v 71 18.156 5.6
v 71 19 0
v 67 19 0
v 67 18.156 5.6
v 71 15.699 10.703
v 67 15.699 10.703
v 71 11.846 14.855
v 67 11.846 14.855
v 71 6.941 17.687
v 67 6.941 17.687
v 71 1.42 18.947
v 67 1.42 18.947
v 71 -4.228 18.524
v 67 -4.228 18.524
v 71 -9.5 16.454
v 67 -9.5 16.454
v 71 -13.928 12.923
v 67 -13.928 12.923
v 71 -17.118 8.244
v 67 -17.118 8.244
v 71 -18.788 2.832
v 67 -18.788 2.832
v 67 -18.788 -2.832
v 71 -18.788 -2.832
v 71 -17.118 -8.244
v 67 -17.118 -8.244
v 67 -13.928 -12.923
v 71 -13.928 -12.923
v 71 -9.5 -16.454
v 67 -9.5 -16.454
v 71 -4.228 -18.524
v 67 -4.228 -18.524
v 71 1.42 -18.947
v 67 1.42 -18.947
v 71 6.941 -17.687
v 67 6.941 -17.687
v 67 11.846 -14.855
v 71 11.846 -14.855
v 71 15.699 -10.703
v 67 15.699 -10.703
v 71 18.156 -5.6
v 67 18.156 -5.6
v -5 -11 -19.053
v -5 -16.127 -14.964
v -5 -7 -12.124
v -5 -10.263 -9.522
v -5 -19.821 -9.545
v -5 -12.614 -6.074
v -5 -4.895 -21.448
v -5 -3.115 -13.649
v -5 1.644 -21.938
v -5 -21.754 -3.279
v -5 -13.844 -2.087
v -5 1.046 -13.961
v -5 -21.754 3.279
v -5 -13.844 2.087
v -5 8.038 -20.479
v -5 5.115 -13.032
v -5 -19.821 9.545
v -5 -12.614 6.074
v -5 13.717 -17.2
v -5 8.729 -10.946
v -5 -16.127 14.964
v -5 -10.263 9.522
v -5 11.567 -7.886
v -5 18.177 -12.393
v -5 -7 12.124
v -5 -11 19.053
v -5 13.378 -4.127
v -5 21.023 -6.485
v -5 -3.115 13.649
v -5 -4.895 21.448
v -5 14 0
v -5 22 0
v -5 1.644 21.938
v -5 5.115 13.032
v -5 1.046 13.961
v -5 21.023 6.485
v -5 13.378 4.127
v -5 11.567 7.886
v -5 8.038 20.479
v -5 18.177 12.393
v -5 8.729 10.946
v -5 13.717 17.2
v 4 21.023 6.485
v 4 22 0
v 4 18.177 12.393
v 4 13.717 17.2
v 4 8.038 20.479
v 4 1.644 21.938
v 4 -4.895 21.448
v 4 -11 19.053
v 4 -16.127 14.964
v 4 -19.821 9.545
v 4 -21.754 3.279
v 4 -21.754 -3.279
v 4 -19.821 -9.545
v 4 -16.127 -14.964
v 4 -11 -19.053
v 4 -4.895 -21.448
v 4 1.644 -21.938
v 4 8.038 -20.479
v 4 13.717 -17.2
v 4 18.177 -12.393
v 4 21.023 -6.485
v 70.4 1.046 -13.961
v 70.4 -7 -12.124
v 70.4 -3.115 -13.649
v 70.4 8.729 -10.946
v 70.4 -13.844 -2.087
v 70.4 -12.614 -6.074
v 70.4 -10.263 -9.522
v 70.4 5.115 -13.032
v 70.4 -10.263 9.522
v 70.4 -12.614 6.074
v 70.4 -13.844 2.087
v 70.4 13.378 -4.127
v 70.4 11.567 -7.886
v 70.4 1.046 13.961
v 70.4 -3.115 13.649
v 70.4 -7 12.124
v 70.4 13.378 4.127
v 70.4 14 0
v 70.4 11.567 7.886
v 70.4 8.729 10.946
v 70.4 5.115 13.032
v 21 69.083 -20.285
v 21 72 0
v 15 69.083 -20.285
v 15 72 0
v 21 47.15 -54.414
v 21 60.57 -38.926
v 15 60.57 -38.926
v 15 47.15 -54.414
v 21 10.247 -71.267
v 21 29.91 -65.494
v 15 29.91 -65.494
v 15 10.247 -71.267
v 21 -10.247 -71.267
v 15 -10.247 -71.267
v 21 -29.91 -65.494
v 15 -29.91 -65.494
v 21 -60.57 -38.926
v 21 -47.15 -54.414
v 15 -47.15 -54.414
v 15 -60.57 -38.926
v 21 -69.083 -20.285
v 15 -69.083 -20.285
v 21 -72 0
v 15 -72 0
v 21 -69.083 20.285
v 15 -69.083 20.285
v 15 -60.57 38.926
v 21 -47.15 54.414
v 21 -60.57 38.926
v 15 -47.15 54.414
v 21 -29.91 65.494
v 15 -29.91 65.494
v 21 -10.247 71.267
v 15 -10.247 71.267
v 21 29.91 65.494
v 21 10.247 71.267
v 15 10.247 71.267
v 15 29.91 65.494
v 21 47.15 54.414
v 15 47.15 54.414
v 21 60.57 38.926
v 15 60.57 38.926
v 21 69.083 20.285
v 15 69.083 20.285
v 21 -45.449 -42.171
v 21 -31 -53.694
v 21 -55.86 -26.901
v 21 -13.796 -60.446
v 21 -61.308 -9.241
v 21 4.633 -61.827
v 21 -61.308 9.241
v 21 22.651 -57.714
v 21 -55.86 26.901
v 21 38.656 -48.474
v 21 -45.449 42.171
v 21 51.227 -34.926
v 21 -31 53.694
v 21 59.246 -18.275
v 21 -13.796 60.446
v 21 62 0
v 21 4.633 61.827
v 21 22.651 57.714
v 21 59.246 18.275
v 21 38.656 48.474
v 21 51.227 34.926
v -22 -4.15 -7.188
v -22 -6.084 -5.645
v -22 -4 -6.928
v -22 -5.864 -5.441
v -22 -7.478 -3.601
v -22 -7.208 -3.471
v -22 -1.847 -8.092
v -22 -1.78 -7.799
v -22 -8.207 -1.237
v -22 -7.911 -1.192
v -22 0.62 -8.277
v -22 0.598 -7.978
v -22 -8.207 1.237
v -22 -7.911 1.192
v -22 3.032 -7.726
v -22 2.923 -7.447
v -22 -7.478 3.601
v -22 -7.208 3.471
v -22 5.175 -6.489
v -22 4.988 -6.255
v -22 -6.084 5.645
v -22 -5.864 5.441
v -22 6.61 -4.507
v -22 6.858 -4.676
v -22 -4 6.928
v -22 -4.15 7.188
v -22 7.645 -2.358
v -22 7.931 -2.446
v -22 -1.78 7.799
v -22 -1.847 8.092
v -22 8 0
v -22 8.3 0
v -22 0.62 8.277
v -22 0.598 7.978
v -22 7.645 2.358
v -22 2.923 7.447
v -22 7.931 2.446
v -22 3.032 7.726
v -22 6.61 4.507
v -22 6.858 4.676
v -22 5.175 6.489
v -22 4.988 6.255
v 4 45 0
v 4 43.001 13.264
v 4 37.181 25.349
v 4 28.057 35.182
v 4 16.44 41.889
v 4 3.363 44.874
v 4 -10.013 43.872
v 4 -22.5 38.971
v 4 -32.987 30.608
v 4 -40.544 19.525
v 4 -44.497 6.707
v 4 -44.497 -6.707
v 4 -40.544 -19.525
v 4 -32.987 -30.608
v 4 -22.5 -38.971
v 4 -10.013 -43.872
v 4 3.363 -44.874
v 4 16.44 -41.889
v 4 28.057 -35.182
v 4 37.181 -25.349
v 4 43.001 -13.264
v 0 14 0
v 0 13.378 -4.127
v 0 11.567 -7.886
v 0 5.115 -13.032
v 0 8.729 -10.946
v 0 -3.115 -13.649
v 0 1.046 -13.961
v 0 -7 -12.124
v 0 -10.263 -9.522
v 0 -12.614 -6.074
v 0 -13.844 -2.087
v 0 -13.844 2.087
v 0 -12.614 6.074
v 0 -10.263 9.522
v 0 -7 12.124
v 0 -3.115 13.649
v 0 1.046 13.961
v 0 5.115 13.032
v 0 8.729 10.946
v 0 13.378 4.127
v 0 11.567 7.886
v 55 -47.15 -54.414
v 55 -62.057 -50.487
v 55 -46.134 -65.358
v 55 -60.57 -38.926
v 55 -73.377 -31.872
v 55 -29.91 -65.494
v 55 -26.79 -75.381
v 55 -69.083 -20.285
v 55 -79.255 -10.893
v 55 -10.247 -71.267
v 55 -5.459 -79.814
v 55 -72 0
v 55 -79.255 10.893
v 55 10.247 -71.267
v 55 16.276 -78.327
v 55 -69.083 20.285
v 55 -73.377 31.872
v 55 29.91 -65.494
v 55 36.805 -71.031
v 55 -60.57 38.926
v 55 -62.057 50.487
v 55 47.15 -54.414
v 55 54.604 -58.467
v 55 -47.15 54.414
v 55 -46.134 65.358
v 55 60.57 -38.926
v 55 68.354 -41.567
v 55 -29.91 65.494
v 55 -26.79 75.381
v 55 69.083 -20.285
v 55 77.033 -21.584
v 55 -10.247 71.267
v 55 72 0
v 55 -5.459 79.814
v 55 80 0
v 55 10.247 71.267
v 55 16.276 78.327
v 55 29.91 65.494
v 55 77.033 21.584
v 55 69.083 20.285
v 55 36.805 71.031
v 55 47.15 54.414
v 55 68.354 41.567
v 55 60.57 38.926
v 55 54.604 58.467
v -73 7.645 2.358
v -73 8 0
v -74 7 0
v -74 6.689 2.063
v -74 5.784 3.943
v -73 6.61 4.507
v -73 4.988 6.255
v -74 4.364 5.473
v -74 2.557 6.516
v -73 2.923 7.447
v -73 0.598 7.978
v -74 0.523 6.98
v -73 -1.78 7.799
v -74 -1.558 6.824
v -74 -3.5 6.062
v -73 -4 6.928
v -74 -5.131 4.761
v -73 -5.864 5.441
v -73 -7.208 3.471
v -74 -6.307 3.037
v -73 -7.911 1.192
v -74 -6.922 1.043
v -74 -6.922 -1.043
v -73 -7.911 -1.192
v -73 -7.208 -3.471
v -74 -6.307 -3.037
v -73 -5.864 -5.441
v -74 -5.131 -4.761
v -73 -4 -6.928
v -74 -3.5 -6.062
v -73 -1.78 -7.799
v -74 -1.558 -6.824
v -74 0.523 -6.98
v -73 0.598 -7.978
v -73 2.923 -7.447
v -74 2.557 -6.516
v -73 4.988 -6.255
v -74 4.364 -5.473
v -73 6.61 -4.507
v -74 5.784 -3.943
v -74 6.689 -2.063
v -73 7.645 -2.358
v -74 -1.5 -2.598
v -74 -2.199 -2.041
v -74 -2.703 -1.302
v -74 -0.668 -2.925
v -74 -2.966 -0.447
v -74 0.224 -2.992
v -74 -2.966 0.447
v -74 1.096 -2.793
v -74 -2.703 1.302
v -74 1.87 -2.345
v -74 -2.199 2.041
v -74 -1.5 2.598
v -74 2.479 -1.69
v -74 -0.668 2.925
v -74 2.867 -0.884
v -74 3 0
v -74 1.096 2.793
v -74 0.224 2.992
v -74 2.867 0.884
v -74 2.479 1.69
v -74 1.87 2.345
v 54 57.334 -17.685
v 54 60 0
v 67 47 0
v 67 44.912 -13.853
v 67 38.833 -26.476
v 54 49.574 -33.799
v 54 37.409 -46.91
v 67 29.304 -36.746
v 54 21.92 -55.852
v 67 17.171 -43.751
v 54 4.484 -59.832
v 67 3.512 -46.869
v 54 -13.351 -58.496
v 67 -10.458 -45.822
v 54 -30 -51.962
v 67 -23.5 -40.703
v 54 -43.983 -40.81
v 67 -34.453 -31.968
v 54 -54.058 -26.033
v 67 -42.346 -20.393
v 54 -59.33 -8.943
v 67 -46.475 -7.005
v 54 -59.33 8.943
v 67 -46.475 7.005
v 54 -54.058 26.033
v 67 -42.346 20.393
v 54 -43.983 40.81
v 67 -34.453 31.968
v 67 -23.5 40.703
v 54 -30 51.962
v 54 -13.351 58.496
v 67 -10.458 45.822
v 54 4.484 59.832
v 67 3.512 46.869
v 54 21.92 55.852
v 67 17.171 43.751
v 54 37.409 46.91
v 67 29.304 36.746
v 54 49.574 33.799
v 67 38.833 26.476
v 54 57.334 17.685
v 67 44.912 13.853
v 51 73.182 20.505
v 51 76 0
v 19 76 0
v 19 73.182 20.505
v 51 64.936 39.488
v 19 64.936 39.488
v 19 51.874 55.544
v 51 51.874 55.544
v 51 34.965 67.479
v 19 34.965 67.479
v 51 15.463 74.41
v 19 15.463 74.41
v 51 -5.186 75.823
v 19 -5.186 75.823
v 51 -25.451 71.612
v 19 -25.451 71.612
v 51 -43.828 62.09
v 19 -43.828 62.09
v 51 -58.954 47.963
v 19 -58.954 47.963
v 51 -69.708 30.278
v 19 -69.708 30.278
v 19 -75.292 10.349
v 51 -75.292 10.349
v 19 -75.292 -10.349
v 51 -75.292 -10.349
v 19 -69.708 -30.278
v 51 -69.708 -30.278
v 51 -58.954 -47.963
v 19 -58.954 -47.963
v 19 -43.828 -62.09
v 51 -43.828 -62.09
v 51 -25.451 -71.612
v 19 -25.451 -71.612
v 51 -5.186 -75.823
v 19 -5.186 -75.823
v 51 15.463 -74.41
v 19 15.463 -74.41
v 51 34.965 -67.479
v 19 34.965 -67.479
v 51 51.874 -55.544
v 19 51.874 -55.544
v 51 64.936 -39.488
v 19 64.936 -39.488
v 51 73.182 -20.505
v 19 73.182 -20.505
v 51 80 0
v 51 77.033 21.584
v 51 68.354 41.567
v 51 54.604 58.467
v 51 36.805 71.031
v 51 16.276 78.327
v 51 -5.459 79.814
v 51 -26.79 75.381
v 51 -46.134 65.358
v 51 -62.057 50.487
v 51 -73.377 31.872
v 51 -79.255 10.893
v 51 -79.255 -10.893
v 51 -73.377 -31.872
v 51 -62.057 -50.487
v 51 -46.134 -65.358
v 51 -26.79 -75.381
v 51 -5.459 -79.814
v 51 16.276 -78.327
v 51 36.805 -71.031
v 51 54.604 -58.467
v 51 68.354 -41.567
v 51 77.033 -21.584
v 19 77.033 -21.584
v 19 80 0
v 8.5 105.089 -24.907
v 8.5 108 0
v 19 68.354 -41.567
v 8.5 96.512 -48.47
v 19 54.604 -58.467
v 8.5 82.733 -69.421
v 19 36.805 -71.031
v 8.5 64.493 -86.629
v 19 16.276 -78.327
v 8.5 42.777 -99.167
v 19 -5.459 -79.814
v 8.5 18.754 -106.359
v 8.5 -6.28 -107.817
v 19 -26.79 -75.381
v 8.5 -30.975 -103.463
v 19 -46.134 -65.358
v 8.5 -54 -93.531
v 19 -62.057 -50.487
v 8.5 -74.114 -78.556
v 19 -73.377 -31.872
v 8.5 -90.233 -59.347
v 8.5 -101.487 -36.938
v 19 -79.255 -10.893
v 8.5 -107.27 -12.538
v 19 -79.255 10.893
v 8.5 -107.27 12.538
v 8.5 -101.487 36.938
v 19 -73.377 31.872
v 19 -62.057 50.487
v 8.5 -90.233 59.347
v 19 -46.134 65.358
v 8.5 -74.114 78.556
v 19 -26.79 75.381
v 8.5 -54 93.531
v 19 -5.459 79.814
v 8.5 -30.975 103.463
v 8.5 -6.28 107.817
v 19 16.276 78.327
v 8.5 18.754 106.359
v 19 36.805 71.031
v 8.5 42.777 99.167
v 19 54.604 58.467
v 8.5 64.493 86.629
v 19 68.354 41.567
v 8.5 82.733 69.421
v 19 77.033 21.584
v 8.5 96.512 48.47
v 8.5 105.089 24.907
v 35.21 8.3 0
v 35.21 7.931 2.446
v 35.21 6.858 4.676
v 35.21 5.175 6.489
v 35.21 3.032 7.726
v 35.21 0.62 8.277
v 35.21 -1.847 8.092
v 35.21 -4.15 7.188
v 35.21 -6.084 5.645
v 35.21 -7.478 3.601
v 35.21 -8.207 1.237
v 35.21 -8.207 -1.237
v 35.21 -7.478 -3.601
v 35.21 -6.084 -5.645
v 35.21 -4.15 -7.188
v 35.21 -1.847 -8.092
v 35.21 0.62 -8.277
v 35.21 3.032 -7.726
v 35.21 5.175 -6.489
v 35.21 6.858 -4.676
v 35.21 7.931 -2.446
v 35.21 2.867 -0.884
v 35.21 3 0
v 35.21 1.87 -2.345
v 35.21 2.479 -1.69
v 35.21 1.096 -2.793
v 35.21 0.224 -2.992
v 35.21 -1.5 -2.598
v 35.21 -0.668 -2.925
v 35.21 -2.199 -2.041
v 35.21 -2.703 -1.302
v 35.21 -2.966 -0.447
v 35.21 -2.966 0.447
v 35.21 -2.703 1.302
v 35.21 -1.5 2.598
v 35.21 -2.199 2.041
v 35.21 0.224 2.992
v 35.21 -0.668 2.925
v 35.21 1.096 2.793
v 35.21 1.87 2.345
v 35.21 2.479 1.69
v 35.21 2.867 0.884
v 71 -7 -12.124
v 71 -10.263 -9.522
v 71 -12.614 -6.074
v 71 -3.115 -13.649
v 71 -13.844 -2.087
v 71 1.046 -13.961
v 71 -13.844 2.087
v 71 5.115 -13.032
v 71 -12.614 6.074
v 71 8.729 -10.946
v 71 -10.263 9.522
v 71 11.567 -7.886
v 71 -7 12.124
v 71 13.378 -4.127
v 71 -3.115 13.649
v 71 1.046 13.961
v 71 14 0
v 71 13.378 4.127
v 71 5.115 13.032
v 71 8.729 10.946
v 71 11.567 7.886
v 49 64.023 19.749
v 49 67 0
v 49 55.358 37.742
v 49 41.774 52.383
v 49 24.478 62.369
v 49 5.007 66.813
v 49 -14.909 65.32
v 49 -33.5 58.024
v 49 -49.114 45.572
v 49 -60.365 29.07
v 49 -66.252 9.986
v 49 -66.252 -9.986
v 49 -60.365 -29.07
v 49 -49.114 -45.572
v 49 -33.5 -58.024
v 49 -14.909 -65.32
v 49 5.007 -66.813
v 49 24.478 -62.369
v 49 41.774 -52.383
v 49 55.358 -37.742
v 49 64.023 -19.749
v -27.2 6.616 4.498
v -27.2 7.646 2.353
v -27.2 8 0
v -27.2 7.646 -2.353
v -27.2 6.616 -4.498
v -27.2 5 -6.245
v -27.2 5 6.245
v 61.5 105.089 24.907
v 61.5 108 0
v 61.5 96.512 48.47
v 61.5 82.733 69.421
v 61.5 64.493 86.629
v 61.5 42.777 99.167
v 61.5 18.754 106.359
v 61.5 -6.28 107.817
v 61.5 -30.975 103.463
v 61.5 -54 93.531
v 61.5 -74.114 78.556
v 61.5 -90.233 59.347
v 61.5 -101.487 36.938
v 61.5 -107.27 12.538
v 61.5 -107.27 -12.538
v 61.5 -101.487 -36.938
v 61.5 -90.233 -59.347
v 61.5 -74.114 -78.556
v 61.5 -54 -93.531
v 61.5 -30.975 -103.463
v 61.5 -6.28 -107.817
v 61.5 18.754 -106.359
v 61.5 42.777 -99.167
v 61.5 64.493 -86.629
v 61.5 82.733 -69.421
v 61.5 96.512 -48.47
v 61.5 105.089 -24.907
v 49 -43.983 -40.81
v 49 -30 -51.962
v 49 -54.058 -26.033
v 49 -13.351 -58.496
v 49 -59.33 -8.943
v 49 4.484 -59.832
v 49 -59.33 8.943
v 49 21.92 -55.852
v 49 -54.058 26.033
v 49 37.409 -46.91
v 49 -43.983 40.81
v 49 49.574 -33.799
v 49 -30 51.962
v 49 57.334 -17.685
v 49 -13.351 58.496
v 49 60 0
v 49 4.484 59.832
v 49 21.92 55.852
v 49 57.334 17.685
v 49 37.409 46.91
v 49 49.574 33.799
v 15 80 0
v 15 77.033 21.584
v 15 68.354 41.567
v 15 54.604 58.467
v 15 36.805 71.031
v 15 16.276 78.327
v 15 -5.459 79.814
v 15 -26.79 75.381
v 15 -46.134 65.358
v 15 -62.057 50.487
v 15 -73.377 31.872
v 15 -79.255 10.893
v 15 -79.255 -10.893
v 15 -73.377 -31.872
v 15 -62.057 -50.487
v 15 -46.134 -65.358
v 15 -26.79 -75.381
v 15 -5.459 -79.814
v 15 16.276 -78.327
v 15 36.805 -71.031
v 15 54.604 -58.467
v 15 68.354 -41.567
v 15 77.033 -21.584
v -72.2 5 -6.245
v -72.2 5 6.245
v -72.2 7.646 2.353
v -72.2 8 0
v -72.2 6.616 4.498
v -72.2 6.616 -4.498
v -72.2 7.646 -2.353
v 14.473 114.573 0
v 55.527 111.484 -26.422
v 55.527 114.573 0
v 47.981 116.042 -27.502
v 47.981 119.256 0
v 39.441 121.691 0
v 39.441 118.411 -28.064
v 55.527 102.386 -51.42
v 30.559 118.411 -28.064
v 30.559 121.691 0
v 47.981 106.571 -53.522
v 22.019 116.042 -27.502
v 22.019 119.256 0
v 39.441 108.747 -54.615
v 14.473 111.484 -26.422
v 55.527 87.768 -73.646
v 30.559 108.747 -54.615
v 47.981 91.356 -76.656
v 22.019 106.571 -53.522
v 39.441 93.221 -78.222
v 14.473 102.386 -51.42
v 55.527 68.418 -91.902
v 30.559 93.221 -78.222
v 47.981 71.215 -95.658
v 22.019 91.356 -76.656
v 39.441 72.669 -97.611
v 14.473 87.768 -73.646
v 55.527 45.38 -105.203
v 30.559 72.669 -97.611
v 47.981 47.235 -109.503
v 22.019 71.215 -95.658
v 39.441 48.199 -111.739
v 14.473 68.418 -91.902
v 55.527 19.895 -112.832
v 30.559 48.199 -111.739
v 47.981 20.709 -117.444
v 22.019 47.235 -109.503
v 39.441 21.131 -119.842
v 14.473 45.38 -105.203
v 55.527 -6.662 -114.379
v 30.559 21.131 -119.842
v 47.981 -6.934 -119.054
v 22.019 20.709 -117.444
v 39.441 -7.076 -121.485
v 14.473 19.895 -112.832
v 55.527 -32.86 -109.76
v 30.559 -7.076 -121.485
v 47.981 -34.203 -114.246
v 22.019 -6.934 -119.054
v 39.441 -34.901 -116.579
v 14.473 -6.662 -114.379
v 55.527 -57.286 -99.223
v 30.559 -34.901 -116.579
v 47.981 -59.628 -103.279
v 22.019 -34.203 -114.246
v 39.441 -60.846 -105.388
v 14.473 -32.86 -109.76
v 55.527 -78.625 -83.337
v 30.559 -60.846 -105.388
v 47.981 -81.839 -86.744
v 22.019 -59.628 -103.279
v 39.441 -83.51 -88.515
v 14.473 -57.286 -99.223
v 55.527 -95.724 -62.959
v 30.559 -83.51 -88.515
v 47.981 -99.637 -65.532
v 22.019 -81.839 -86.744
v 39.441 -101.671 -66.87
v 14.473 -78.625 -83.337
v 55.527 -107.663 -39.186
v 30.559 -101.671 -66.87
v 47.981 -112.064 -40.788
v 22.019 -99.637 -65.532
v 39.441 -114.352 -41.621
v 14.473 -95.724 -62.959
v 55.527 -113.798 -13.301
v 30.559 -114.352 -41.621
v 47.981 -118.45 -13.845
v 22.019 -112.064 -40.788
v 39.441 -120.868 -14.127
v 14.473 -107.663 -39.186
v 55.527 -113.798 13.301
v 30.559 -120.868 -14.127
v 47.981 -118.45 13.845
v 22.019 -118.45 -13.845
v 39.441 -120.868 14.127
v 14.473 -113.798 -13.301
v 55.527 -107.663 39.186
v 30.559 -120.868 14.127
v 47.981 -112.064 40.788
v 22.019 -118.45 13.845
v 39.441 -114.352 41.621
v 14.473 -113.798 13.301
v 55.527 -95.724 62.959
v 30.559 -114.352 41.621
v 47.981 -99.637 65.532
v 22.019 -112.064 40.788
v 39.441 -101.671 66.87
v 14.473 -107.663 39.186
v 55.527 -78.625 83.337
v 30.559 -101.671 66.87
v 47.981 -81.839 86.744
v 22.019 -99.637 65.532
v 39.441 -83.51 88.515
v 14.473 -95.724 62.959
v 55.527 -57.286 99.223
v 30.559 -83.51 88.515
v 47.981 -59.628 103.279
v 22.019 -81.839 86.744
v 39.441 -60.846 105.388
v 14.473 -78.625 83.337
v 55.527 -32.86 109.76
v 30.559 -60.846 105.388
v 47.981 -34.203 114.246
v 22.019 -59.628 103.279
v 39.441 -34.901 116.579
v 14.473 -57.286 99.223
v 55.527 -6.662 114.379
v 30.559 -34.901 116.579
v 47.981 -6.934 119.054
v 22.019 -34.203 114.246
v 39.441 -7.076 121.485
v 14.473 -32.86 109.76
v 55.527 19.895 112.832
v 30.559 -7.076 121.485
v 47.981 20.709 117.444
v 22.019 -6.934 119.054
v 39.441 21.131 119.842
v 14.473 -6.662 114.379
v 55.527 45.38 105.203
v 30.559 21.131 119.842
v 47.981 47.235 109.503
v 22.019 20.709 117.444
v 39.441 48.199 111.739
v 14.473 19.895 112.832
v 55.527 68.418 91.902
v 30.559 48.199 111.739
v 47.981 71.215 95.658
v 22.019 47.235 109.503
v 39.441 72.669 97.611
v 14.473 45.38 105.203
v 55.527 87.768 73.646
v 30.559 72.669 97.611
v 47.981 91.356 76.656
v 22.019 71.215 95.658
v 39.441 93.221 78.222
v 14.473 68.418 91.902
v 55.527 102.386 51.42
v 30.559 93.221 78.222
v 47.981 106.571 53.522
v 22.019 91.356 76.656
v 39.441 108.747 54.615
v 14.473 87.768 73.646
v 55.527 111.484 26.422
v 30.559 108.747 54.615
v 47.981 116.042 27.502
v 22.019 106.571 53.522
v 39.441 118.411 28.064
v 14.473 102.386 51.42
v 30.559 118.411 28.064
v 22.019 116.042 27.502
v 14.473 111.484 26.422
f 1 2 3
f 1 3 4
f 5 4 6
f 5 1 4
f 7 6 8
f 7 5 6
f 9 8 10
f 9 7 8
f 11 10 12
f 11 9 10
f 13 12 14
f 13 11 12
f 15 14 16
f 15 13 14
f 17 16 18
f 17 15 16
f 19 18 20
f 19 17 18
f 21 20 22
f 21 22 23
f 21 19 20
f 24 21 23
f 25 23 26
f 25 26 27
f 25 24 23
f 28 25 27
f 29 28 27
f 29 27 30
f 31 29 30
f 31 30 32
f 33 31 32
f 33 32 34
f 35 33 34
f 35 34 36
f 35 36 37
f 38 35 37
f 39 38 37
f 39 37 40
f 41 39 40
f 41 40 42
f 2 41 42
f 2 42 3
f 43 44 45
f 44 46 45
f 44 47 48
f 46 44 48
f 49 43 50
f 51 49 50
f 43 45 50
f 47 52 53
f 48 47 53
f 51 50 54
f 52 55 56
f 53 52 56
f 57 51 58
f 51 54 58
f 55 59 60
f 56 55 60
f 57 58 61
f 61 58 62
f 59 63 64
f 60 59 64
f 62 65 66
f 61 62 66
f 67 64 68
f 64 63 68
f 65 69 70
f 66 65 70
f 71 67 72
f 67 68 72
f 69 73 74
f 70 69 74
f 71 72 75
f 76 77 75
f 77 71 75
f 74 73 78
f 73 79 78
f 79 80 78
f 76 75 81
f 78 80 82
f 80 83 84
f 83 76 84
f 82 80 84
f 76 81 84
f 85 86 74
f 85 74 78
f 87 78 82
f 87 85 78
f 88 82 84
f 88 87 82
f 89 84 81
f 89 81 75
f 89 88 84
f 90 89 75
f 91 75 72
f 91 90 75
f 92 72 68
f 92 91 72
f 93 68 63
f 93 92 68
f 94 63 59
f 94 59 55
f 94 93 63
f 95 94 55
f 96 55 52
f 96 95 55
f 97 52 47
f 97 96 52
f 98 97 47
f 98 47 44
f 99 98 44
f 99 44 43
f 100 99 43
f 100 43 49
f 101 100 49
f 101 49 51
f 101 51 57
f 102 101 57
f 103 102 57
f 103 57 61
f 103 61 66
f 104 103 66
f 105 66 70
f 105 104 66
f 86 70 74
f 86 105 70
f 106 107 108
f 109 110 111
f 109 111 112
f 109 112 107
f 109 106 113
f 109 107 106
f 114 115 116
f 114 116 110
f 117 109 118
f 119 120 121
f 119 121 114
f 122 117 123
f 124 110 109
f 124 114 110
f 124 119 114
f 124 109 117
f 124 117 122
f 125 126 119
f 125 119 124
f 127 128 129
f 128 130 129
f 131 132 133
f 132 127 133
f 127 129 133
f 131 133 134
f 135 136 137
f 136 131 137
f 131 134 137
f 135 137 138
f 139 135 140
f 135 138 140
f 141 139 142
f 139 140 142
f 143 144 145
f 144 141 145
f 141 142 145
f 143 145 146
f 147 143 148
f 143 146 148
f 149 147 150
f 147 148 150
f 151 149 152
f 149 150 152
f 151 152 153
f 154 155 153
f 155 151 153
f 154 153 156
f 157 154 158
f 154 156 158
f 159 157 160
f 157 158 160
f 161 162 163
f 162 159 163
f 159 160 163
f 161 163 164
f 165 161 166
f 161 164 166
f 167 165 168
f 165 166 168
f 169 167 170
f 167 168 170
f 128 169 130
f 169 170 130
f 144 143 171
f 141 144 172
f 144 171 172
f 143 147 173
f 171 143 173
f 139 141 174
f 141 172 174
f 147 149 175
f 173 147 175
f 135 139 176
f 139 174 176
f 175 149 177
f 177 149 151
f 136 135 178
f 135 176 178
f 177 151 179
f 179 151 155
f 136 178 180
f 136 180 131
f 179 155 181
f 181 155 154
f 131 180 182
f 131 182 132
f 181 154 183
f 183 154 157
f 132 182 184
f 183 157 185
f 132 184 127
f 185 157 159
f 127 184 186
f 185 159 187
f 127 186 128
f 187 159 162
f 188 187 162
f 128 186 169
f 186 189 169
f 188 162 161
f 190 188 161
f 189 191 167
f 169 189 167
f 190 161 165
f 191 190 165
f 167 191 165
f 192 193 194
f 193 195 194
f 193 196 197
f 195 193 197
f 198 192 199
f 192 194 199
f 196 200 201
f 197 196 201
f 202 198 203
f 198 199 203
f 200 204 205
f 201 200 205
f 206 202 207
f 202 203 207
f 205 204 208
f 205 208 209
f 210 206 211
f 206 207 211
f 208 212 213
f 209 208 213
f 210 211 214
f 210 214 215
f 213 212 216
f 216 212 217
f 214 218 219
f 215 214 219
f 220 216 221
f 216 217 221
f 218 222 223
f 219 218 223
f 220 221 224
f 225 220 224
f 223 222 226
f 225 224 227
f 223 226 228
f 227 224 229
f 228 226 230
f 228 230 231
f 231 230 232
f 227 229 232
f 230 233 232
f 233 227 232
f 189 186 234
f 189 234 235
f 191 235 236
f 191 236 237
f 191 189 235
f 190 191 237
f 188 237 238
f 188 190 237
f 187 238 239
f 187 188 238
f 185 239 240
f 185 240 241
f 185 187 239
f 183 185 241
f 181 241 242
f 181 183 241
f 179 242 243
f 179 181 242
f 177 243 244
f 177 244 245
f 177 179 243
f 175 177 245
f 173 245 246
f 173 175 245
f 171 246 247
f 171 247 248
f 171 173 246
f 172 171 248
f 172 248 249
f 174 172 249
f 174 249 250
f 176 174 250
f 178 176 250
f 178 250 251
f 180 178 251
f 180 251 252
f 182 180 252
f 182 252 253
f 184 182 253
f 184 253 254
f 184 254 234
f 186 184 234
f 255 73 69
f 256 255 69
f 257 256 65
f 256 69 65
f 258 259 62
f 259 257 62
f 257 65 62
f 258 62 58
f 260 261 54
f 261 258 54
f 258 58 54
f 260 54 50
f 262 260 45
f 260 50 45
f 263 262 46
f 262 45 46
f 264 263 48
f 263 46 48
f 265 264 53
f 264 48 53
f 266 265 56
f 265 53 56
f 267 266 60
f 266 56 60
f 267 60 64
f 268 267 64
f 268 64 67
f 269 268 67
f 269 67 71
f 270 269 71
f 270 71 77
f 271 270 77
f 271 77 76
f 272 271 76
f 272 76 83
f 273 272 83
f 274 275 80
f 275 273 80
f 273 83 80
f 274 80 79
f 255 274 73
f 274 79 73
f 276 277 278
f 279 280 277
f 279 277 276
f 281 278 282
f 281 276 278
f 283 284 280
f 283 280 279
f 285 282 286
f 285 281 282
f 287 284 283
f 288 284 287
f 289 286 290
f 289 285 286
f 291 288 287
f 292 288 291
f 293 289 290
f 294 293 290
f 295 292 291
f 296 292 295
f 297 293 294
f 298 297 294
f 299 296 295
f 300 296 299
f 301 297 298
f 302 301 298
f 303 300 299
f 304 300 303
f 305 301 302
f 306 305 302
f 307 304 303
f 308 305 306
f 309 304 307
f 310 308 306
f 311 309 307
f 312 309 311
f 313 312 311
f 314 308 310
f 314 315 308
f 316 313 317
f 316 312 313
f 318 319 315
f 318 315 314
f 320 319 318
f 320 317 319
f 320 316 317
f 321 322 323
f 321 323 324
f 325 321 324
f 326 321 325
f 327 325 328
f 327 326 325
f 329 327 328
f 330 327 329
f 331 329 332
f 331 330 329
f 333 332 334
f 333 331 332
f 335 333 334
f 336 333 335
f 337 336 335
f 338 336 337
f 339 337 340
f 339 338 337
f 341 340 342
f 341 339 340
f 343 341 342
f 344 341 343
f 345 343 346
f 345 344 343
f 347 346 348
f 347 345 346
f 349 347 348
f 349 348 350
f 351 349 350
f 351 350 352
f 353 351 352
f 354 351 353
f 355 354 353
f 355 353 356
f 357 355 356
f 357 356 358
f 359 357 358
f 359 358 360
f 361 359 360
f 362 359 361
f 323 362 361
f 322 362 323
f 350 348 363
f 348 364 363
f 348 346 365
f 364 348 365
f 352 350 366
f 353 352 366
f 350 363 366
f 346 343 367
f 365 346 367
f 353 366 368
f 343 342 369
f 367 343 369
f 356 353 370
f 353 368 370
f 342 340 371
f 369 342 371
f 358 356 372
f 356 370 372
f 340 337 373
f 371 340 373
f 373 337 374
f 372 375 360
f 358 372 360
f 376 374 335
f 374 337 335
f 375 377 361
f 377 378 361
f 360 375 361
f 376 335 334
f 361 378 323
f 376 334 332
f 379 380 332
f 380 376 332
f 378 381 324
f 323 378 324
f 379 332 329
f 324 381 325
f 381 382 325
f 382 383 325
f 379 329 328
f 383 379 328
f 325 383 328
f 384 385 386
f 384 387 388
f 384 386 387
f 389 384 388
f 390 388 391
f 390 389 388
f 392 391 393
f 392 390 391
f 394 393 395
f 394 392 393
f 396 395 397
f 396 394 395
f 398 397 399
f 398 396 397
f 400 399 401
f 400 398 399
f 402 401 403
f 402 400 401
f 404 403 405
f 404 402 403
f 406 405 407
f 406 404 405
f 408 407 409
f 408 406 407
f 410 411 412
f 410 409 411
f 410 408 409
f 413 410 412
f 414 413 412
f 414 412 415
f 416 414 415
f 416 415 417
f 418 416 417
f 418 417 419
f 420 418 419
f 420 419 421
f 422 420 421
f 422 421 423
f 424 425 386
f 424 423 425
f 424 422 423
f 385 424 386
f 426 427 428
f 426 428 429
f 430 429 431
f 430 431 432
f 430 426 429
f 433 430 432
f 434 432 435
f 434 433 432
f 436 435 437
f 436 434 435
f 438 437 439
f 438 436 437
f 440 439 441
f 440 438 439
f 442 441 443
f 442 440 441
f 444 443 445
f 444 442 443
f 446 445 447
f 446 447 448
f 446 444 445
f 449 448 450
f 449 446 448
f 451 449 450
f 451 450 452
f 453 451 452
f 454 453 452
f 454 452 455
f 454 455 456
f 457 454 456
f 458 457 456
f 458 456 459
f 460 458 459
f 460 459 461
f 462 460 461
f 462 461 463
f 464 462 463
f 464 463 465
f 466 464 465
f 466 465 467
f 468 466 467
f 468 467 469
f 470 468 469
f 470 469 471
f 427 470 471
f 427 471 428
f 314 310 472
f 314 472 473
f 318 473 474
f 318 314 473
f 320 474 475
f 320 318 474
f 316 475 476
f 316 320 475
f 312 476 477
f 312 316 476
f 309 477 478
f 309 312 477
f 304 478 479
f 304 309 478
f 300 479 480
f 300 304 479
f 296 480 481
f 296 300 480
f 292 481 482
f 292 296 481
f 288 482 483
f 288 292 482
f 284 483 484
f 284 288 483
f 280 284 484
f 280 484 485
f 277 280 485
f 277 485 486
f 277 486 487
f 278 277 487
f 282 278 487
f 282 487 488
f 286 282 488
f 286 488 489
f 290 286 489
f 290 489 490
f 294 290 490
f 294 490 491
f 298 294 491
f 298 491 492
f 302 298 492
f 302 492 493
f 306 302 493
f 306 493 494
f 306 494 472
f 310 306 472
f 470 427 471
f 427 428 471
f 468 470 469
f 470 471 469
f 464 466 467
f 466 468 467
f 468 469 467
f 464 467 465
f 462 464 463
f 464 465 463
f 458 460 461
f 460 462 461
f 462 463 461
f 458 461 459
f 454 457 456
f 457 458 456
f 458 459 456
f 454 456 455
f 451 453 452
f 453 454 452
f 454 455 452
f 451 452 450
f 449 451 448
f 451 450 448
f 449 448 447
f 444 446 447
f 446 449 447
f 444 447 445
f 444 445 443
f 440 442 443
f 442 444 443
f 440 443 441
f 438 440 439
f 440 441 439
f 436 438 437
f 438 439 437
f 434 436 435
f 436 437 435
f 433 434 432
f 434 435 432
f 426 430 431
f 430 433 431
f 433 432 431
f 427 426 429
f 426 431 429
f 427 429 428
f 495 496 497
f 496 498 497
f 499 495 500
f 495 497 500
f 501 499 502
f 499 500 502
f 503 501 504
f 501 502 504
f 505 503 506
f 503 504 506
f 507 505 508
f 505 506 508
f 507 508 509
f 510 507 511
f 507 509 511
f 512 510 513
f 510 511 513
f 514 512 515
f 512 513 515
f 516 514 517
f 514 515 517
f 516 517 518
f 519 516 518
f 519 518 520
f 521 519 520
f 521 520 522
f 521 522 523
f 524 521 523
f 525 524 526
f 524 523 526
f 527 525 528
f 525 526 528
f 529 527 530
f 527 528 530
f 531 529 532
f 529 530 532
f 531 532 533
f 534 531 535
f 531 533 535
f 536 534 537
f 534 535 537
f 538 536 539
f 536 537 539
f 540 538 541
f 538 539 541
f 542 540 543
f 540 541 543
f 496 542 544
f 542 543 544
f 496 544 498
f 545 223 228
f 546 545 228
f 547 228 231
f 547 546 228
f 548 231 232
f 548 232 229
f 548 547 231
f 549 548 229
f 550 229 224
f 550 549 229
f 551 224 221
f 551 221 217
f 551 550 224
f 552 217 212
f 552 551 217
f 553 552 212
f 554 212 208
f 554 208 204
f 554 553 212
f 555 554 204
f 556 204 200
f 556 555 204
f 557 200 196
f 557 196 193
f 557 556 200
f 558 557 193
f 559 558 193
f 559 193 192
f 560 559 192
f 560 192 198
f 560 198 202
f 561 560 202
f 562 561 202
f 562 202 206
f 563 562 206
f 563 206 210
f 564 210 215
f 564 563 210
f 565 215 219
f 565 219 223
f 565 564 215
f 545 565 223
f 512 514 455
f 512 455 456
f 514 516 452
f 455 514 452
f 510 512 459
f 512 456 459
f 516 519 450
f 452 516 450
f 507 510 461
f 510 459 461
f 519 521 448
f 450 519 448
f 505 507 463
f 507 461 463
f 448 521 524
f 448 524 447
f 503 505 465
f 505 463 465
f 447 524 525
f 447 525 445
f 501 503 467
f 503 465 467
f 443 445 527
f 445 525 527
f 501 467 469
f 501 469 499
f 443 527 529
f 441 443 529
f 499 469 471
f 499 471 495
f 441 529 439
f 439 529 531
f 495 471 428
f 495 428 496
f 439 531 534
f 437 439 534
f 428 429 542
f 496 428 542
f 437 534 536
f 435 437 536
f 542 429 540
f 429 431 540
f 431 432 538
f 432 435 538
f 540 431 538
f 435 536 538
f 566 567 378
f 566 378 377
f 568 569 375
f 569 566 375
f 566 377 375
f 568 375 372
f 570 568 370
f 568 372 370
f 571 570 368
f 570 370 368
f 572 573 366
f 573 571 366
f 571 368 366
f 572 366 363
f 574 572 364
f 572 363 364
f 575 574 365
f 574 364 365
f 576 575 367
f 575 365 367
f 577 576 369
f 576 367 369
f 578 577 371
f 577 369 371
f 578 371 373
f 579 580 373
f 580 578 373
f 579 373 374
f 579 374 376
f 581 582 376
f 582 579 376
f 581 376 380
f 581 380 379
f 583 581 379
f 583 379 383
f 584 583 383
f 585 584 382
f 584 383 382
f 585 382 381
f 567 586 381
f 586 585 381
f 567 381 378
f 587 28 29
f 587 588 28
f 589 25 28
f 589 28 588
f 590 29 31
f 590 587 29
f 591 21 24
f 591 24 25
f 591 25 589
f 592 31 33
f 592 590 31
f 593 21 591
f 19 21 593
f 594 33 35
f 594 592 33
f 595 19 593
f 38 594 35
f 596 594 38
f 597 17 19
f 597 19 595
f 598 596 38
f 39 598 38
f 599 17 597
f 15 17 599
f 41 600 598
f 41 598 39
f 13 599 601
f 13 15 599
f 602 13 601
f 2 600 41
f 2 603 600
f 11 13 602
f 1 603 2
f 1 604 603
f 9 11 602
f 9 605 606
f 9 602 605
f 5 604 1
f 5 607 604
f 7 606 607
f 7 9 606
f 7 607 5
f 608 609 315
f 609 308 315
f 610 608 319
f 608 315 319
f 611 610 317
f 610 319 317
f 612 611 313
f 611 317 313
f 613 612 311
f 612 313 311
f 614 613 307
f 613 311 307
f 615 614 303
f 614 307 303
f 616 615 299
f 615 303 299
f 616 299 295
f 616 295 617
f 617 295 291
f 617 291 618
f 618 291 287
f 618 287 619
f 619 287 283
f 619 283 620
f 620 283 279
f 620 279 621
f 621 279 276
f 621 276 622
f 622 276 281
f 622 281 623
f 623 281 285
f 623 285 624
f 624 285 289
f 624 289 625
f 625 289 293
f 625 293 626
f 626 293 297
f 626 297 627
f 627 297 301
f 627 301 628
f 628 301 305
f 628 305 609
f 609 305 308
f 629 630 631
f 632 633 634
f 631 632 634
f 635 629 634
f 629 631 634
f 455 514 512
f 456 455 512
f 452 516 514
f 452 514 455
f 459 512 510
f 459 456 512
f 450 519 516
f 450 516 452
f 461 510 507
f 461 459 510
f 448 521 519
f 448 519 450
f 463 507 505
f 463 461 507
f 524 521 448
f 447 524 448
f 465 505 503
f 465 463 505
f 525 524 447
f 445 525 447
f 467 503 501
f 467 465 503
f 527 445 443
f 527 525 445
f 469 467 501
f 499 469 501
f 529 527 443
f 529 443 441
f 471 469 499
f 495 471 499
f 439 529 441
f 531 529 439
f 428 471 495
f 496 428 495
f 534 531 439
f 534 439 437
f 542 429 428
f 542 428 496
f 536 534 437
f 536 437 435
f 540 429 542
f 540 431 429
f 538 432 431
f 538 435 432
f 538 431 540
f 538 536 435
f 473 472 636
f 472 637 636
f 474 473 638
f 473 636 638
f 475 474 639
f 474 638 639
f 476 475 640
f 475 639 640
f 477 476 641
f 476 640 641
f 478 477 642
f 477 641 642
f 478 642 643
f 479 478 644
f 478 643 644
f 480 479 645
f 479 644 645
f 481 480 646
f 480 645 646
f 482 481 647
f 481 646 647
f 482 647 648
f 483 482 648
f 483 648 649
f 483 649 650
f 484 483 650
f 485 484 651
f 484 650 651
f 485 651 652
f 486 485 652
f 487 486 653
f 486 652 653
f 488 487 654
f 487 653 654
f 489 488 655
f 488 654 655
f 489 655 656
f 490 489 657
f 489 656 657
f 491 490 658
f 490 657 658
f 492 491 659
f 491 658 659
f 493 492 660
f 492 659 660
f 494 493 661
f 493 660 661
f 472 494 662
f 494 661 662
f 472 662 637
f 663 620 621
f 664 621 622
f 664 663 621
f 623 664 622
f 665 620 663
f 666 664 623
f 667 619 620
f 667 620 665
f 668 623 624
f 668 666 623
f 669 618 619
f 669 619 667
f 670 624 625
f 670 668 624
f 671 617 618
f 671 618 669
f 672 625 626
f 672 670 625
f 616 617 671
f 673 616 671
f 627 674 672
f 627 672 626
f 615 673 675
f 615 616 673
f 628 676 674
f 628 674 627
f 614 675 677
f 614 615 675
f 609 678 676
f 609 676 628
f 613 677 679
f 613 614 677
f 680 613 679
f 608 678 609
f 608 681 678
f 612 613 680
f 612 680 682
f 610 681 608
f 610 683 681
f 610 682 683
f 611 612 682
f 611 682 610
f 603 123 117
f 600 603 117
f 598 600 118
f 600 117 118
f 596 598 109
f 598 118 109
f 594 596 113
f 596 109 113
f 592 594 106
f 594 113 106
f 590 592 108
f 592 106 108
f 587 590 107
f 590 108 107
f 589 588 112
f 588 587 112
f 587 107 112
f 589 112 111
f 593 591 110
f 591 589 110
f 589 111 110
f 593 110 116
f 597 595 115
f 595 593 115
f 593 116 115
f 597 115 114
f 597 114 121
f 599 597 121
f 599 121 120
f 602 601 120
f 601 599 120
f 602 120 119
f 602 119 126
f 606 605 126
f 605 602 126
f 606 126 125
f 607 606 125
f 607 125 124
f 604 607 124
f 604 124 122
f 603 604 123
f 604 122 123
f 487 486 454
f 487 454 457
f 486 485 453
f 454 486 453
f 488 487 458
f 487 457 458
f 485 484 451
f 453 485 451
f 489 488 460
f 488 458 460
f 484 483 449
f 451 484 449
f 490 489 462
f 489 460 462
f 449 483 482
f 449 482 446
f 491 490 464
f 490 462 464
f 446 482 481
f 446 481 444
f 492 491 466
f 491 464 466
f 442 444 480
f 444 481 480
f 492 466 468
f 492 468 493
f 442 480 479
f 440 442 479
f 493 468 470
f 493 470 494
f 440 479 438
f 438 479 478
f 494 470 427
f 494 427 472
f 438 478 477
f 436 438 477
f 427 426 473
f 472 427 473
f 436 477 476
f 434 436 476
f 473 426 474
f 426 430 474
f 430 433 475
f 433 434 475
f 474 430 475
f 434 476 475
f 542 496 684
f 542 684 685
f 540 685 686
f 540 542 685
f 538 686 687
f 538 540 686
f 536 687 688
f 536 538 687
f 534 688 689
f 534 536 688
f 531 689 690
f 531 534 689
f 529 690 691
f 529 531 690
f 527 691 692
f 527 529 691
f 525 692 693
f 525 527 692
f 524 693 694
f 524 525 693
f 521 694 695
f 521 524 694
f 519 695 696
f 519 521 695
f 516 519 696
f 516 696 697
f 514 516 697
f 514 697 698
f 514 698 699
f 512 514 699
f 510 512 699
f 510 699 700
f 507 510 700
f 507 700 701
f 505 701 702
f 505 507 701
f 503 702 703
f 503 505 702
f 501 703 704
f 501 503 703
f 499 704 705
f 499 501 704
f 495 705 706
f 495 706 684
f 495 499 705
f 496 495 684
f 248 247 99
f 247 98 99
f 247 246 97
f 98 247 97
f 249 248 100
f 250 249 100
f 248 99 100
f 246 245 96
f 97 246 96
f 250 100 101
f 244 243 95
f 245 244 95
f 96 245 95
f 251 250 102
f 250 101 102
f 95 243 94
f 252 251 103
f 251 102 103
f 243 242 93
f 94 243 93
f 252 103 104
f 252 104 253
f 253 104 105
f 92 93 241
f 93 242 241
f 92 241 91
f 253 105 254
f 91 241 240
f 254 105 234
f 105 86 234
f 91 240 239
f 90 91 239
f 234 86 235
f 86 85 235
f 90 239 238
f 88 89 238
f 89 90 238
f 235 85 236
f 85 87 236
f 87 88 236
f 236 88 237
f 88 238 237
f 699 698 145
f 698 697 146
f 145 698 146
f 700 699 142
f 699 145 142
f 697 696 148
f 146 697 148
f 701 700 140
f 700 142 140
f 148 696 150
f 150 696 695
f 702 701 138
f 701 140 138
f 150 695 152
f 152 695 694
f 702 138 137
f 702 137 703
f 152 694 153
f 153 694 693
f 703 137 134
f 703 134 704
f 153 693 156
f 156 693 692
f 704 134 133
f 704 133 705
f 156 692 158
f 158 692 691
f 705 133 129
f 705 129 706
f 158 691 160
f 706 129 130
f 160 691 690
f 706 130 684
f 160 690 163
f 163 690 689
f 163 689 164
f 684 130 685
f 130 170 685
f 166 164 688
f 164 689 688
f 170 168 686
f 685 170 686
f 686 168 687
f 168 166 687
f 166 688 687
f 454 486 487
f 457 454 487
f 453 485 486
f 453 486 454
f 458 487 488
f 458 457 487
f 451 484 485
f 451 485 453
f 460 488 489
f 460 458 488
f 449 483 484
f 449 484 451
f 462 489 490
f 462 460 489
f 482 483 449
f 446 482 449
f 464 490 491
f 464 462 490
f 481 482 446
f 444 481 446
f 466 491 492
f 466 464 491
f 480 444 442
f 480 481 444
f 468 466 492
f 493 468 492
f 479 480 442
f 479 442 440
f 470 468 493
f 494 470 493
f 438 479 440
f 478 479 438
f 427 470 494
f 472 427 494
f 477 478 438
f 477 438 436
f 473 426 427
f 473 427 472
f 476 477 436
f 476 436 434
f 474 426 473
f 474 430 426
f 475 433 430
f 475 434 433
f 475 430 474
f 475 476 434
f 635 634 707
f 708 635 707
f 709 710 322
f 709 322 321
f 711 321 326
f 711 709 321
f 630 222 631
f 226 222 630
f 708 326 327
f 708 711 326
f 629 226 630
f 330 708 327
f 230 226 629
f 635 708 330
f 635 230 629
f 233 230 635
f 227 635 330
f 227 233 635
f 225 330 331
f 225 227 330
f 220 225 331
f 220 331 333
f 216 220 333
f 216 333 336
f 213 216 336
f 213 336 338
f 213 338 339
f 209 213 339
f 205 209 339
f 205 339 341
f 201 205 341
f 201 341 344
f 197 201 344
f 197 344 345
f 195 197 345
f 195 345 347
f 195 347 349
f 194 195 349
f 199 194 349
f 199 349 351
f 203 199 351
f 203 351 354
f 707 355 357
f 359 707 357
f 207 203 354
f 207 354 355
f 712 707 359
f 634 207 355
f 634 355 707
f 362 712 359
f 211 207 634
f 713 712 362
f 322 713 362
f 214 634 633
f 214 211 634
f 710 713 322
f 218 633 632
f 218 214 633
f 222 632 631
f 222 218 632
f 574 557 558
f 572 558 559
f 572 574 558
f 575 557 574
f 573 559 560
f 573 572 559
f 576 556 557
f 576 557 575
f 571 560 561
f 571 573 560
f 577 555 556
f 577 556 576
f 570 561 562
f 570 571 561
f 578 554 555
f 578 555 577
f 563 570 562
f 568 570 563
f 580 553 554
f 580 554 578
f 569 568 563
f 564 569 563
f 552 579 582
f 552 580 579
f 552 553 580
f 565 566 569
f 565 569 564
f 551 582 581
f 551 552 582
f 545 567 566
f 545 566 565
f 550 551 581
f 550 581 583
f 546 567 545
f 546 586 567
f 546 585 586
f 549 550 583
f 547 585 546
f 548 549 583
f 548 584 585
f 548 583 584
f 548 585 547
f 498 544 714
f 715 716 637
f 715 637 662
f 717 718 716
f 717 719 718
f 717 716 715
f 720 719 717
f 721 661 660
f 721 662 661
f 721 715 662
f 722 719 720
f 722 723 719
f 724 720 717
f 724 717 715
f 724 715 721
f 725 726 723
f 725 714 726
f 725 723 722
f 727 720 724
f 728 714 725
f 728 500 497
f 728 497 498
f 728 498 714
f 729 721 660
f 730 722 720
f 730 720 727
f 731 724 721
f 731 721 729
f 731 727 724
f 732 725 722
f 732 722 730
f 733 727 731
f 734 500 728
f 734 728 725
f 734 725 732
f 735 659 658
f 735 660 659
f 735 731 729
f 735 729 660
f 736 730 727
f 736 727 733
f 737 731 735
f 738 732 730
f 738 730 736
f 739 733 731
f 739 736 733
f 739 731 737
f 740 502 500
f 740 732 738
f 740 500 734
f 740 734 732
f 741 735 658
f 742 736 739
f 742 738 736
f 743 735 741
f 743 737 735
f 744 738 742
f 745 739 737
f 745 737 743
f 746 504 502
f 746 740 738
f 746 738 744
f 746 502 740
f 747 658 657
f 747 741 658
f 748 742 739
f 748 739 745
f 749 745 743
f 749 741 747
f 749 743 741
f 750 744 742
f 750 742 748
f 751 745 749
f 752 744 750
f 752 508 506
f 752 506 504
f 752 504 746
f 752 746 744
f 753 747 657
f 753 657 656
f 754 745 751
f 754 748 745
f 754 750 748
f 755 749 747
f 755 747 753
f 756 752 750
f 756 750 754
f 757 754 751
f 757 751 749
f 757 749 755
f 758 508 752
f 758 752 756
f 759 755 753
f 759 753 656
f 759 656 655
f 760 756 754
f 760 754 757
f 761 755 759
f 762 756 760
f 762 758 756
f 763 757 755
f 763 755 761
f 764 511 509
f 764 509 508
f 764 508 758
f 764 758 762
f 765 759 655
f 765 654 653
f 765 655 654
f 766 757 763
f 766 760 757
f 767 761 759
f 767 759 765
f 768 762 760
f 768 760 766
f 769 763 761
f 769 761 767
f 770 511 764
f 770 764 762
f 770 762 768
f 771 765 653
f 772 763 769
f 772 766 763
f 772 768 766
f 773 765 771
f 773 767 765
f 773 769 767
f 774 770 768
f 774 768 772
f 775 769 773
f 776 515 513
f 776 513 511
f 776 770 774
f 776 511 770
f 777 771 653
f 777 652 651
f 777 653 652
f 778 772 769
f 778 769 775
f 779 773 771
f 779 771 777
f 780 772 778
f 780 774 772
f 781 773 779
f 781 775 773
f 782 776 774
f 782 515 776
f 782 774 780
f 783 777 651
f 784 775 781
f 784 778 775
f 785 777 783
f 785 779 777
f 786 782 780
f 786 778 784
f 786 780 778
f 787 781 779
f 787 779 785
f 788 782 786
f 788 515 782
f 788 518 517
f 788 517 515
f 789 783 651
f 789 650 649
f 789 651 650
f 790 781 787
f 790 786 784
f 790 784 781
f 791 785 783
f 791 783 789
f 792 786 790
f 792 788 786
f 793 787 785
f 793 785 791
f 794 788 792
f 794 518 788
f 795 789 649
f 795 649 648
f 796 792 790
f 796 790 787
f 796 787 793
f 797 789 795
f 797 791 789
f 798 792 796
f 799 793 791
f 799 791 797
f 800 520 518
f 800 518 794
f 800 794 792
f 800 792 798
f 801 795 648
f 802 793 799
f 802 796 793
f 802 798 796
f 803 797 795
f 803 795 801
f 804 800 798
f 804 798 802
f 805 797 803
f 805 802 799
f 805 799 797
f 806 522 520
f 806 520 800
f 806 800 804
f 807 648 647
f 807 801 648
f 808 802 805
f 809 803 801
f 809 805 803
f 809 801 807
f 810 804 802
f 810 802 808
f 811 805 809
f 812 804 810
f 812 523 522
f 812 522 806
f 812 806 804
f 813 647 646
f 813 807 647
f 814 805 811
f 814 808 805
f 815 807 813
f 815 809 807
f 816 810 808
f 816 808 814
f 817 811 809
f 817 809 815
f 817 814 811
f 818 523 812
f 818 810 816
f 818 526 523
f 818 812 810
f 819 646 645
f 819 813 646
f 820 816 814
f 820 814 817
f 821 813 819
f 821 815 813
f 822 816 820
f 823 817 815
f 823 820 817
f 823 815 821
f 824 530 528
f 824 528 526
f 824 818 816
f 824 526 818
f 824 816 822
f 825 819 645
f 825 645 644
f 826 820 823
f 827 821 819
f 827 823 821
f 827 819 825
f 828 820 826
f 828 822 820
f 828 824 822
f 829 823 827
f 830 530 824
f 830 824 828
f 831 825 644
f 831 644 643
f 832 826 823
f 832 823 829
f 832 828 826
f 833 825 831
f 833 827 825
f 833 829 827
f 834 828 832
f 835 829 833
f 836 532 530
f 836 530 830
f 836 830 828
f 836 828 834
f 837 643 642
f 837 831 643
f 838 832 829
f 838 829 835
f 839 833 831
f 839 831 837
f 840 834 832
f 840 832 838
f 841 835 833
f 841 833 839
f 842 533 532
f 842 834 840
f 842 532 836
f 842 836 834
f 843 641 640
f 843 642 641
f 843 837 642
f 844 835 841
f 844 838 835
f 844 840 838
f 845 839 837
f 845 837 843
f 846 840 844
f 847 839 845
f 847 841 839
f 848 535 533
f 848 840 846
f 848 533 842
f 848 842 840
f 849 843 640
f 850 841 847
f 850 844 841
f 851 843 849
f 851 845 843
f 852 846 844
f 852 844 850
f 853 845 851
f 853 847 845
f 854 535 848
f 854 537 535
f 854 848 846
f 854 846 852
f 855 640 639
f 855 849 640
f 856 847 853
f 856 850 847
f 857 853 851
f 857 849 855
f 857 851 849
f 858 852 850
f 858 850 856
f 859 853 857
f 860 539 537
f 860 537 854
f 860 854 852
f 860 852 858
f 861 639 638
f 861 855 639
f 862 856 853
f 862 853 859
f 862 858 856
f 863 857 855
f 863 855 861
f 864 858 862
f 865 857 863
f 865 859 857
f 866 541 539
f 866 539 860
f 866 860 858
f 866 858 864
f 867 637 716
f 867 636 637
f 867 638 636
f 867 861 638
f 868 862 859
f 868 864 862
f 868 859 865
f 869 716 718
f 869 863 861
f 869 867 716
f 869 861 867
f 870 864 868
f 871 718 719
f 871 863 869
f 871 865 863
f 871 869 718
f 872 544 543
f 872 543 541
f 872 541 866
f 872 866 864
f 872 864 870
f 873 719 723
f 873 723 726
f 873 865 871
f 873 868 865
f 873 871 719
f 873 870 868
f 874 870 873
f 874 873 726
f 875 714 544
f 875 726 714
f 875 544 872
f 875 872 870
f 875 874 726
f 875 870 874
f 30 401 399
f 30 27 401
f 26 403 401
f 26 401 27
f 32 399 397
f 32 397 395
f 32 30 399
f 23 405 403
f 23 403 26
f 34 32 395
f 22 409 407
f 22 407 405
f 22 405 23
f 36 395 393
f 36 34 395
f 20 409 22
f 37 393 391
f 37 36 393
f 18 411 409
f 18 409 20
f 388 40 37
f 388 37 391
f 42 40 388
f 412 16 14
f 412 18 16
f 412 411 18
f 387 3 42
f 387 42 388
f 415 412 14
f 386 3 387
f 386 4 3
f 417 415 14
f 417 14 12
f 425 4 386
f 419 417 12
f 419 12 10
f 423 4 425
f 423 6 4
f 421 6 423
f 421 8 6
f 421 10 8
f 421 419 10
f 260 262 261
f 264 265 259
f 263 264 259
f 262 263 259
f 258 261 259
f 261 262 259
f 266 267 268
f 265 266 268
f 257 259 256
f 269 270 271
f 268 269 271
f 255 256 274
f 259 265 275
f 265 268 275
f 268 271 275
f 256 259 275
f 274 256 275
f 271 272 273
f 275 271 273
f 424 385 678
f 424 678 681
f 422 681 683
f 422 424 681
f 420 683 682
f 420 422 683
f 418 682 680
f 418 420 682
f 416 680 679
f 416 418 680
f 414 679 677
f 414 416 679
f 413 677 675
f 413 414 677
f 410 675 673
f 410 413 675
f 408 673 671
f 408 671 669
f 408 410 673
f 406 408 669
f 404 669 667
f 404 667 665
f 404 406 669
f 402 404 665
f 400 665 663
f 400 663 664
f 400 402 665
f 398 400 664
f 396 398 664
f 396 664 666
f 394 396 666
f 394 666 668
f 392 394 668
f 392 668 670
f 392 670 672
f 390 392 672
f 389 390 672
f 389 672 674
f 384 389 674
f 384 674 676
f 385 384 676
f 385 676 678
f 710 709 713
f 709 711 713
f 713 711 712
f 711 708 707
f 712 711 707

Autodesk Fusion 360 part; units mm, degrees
sketch "Sketch1" plane through (0, 0, 0) normal (0, 0, 1) x (1, 0, 0)
  line L0 (-5, 14) -> (-5, 22)
  line L1 (-5, 22) -> (4, 22)
  line L2 (4, 22) -> (4, 45)
  line L3 (4, 45) -> (21, 62)
  line L4 (21, 62) -> (21, 72)
  line L5 (21, 72) -> (15, 72)
  line L6 (15, 72) -> (15, 80)
  line L7 (15, 80) -> (19, 80)
  line L8 (19, 80) -> (19, 76)
  line L9 (19, 76) -> (51, 76)
  line L10 (51, 76) -> (51, 80)
  line L11 (51, 80) -> (55, 80)
  line L12 (55, 80) -> (55, 72)
  line L13 (55, 72) -> (49, 67)
  line L14 (49, 67) -> (49, 60)
  line L15 (49, 60) -> (54, 60)
  line L16 (54, 60) -> (67, 47)
  line L17 (67, 47) -> (67, 19)
  line L18 (67, 19) -> (71, 19)
  line L19 (71, 19) -> (71, 14)
  line L20 (71, 14) -> (70.4, 14)
  line L21 (70.4, 14) -> (70.4, 0)
  line L22 (70.4, 0) -> (0, 0)
  line L23 (0, 0) -> (0, 14)
  line L24 (0, 14) -> (-5, 14)
  dimension "d1" = 14
  dimension "d2" = 8
  dimension "d3" = 9
  dimension "d4" = 23
  dimension "d5" = 17
  dimension "d6" = 17
  dimension "d7" = 10
  dimension "d8" = 6
  dimension "d9" = 4
  dimension "d10" = 8
  dimension "d12" = 7
  dimension "d13" = 6
  dimension "d14" = 5
  dimension "d15" = 5
  dimension "d16" = 13
  dimension "d17" = 13
  dimension "d18" = 28
  dimension "d19" = 4
  dimension "d20" = 5
  dimension "d21" = 0.6
  dimension "d22" = 40
  dimension "d39" = 5
revolve "Revolve1" add sketch "Sketch1" angle 360 about axis through (1.75, 0, 0) along (1, 0, 0) makes body 1
sketch "Sketch2" plane through (0, 0, 0) normal (0, 0, 1) x (1, 0, 0)
  line L0 (51, 80) -> (61.5, 108)
  line L1 (-1.394, 122) -> (67.606, 122) construction
  line L2 (51, 80) -> (55, 80) construction
  line L3 (35, 129) -> (35, 53) construction
  line L4 (15, 72) -> (15, 80) construction
  line L5 (55, 80) -> (55, 72) construction
  line L6 (51, 80) -> (51, 76)
  line L7 (51, 76) -> (19, 76)
  line L8 (19, 76) -> (19, 80)
  line L9 (19, 80) -> (8.5, 108)
  arc A0 (61.5, 108) -> (8.5, 108) centre (35, 89.9196) ccw
  point P0 (51, 76)
  point P1 (19, 76)
  point P2 (19, 80)
  dimension "d29" = 42
  dimension "d30" = 28
  dimension "d31" = 53
revolve "Revolve2" add sketch "Sketch2" angle 360 about axis through (1.75, 0, 0) along (1, 0, 0) separate body makes body 2
sketch "Sketch3" plane through (0, 0, 0) normal (0, 0, 1) x (1, 0, 0)
  line L0 (35.2097, 3) -> (-74, 3)
  line L1 (-74, 3) -> (-74, 8)
  line L2 (-74, 8) -> (-22, 8)
  line L3 (-22, 8) -> (-22, 8.3)
  line L4 (-22, 8.3) -> (35.2097, 8.3)
  line L5 (35.2097, 8.3) -> (35.2097, 3)
  line L6 (70.4, 0) -> (0, 0)
  line L7 (-74, 0) -> (12.1646, 0) construction
  line L8 (-5, 14) -> (-5, 22) construction
  dimension "d33" = 52
  dimension "d34" = 8
  dimension "d35" = 8.3
  dimension "d36" = 5
  dimension "d37" = 69
revolve "Revolve3" add sketch "Sketch3" angle 360 about axis through (1.75, 0, 0) along (1, 0, 0) separate body makes body 3
ref_plane "WorkPlane1" through (-61.2975, 0, 8) normal (0, 0, 1) x (0, 1, 0)
sketch "Sketch4" plane through (0, 0, 0) normal (0, 0, 1) x (1, 0, 0)
  line L0 (-72.2, 8) -> (-27.2, 8)
  line L1 (-27.2, 8) -> (-27.2, 5)
  line L2 (-27.2, 5) -> (-72.2, 5)
  line L3 (-72.2, 5) -> (-72.2, 8)
  line L4 (-74, -8) -> (-74, 8)
  line L5 (-74, 8) -> (-22, 8)
  dimension "d41" = 45
  dimension "d42" = 1.8
  dimension "d43" = 3
extrude "Extrude1" cut sketch "Sketch4" along normal mid plane 20 bodies 3
chamfer "Chamfer1" distance 1 angle 45 1 edges at (-74, -2.8929, 7.4586) on bodies 3
